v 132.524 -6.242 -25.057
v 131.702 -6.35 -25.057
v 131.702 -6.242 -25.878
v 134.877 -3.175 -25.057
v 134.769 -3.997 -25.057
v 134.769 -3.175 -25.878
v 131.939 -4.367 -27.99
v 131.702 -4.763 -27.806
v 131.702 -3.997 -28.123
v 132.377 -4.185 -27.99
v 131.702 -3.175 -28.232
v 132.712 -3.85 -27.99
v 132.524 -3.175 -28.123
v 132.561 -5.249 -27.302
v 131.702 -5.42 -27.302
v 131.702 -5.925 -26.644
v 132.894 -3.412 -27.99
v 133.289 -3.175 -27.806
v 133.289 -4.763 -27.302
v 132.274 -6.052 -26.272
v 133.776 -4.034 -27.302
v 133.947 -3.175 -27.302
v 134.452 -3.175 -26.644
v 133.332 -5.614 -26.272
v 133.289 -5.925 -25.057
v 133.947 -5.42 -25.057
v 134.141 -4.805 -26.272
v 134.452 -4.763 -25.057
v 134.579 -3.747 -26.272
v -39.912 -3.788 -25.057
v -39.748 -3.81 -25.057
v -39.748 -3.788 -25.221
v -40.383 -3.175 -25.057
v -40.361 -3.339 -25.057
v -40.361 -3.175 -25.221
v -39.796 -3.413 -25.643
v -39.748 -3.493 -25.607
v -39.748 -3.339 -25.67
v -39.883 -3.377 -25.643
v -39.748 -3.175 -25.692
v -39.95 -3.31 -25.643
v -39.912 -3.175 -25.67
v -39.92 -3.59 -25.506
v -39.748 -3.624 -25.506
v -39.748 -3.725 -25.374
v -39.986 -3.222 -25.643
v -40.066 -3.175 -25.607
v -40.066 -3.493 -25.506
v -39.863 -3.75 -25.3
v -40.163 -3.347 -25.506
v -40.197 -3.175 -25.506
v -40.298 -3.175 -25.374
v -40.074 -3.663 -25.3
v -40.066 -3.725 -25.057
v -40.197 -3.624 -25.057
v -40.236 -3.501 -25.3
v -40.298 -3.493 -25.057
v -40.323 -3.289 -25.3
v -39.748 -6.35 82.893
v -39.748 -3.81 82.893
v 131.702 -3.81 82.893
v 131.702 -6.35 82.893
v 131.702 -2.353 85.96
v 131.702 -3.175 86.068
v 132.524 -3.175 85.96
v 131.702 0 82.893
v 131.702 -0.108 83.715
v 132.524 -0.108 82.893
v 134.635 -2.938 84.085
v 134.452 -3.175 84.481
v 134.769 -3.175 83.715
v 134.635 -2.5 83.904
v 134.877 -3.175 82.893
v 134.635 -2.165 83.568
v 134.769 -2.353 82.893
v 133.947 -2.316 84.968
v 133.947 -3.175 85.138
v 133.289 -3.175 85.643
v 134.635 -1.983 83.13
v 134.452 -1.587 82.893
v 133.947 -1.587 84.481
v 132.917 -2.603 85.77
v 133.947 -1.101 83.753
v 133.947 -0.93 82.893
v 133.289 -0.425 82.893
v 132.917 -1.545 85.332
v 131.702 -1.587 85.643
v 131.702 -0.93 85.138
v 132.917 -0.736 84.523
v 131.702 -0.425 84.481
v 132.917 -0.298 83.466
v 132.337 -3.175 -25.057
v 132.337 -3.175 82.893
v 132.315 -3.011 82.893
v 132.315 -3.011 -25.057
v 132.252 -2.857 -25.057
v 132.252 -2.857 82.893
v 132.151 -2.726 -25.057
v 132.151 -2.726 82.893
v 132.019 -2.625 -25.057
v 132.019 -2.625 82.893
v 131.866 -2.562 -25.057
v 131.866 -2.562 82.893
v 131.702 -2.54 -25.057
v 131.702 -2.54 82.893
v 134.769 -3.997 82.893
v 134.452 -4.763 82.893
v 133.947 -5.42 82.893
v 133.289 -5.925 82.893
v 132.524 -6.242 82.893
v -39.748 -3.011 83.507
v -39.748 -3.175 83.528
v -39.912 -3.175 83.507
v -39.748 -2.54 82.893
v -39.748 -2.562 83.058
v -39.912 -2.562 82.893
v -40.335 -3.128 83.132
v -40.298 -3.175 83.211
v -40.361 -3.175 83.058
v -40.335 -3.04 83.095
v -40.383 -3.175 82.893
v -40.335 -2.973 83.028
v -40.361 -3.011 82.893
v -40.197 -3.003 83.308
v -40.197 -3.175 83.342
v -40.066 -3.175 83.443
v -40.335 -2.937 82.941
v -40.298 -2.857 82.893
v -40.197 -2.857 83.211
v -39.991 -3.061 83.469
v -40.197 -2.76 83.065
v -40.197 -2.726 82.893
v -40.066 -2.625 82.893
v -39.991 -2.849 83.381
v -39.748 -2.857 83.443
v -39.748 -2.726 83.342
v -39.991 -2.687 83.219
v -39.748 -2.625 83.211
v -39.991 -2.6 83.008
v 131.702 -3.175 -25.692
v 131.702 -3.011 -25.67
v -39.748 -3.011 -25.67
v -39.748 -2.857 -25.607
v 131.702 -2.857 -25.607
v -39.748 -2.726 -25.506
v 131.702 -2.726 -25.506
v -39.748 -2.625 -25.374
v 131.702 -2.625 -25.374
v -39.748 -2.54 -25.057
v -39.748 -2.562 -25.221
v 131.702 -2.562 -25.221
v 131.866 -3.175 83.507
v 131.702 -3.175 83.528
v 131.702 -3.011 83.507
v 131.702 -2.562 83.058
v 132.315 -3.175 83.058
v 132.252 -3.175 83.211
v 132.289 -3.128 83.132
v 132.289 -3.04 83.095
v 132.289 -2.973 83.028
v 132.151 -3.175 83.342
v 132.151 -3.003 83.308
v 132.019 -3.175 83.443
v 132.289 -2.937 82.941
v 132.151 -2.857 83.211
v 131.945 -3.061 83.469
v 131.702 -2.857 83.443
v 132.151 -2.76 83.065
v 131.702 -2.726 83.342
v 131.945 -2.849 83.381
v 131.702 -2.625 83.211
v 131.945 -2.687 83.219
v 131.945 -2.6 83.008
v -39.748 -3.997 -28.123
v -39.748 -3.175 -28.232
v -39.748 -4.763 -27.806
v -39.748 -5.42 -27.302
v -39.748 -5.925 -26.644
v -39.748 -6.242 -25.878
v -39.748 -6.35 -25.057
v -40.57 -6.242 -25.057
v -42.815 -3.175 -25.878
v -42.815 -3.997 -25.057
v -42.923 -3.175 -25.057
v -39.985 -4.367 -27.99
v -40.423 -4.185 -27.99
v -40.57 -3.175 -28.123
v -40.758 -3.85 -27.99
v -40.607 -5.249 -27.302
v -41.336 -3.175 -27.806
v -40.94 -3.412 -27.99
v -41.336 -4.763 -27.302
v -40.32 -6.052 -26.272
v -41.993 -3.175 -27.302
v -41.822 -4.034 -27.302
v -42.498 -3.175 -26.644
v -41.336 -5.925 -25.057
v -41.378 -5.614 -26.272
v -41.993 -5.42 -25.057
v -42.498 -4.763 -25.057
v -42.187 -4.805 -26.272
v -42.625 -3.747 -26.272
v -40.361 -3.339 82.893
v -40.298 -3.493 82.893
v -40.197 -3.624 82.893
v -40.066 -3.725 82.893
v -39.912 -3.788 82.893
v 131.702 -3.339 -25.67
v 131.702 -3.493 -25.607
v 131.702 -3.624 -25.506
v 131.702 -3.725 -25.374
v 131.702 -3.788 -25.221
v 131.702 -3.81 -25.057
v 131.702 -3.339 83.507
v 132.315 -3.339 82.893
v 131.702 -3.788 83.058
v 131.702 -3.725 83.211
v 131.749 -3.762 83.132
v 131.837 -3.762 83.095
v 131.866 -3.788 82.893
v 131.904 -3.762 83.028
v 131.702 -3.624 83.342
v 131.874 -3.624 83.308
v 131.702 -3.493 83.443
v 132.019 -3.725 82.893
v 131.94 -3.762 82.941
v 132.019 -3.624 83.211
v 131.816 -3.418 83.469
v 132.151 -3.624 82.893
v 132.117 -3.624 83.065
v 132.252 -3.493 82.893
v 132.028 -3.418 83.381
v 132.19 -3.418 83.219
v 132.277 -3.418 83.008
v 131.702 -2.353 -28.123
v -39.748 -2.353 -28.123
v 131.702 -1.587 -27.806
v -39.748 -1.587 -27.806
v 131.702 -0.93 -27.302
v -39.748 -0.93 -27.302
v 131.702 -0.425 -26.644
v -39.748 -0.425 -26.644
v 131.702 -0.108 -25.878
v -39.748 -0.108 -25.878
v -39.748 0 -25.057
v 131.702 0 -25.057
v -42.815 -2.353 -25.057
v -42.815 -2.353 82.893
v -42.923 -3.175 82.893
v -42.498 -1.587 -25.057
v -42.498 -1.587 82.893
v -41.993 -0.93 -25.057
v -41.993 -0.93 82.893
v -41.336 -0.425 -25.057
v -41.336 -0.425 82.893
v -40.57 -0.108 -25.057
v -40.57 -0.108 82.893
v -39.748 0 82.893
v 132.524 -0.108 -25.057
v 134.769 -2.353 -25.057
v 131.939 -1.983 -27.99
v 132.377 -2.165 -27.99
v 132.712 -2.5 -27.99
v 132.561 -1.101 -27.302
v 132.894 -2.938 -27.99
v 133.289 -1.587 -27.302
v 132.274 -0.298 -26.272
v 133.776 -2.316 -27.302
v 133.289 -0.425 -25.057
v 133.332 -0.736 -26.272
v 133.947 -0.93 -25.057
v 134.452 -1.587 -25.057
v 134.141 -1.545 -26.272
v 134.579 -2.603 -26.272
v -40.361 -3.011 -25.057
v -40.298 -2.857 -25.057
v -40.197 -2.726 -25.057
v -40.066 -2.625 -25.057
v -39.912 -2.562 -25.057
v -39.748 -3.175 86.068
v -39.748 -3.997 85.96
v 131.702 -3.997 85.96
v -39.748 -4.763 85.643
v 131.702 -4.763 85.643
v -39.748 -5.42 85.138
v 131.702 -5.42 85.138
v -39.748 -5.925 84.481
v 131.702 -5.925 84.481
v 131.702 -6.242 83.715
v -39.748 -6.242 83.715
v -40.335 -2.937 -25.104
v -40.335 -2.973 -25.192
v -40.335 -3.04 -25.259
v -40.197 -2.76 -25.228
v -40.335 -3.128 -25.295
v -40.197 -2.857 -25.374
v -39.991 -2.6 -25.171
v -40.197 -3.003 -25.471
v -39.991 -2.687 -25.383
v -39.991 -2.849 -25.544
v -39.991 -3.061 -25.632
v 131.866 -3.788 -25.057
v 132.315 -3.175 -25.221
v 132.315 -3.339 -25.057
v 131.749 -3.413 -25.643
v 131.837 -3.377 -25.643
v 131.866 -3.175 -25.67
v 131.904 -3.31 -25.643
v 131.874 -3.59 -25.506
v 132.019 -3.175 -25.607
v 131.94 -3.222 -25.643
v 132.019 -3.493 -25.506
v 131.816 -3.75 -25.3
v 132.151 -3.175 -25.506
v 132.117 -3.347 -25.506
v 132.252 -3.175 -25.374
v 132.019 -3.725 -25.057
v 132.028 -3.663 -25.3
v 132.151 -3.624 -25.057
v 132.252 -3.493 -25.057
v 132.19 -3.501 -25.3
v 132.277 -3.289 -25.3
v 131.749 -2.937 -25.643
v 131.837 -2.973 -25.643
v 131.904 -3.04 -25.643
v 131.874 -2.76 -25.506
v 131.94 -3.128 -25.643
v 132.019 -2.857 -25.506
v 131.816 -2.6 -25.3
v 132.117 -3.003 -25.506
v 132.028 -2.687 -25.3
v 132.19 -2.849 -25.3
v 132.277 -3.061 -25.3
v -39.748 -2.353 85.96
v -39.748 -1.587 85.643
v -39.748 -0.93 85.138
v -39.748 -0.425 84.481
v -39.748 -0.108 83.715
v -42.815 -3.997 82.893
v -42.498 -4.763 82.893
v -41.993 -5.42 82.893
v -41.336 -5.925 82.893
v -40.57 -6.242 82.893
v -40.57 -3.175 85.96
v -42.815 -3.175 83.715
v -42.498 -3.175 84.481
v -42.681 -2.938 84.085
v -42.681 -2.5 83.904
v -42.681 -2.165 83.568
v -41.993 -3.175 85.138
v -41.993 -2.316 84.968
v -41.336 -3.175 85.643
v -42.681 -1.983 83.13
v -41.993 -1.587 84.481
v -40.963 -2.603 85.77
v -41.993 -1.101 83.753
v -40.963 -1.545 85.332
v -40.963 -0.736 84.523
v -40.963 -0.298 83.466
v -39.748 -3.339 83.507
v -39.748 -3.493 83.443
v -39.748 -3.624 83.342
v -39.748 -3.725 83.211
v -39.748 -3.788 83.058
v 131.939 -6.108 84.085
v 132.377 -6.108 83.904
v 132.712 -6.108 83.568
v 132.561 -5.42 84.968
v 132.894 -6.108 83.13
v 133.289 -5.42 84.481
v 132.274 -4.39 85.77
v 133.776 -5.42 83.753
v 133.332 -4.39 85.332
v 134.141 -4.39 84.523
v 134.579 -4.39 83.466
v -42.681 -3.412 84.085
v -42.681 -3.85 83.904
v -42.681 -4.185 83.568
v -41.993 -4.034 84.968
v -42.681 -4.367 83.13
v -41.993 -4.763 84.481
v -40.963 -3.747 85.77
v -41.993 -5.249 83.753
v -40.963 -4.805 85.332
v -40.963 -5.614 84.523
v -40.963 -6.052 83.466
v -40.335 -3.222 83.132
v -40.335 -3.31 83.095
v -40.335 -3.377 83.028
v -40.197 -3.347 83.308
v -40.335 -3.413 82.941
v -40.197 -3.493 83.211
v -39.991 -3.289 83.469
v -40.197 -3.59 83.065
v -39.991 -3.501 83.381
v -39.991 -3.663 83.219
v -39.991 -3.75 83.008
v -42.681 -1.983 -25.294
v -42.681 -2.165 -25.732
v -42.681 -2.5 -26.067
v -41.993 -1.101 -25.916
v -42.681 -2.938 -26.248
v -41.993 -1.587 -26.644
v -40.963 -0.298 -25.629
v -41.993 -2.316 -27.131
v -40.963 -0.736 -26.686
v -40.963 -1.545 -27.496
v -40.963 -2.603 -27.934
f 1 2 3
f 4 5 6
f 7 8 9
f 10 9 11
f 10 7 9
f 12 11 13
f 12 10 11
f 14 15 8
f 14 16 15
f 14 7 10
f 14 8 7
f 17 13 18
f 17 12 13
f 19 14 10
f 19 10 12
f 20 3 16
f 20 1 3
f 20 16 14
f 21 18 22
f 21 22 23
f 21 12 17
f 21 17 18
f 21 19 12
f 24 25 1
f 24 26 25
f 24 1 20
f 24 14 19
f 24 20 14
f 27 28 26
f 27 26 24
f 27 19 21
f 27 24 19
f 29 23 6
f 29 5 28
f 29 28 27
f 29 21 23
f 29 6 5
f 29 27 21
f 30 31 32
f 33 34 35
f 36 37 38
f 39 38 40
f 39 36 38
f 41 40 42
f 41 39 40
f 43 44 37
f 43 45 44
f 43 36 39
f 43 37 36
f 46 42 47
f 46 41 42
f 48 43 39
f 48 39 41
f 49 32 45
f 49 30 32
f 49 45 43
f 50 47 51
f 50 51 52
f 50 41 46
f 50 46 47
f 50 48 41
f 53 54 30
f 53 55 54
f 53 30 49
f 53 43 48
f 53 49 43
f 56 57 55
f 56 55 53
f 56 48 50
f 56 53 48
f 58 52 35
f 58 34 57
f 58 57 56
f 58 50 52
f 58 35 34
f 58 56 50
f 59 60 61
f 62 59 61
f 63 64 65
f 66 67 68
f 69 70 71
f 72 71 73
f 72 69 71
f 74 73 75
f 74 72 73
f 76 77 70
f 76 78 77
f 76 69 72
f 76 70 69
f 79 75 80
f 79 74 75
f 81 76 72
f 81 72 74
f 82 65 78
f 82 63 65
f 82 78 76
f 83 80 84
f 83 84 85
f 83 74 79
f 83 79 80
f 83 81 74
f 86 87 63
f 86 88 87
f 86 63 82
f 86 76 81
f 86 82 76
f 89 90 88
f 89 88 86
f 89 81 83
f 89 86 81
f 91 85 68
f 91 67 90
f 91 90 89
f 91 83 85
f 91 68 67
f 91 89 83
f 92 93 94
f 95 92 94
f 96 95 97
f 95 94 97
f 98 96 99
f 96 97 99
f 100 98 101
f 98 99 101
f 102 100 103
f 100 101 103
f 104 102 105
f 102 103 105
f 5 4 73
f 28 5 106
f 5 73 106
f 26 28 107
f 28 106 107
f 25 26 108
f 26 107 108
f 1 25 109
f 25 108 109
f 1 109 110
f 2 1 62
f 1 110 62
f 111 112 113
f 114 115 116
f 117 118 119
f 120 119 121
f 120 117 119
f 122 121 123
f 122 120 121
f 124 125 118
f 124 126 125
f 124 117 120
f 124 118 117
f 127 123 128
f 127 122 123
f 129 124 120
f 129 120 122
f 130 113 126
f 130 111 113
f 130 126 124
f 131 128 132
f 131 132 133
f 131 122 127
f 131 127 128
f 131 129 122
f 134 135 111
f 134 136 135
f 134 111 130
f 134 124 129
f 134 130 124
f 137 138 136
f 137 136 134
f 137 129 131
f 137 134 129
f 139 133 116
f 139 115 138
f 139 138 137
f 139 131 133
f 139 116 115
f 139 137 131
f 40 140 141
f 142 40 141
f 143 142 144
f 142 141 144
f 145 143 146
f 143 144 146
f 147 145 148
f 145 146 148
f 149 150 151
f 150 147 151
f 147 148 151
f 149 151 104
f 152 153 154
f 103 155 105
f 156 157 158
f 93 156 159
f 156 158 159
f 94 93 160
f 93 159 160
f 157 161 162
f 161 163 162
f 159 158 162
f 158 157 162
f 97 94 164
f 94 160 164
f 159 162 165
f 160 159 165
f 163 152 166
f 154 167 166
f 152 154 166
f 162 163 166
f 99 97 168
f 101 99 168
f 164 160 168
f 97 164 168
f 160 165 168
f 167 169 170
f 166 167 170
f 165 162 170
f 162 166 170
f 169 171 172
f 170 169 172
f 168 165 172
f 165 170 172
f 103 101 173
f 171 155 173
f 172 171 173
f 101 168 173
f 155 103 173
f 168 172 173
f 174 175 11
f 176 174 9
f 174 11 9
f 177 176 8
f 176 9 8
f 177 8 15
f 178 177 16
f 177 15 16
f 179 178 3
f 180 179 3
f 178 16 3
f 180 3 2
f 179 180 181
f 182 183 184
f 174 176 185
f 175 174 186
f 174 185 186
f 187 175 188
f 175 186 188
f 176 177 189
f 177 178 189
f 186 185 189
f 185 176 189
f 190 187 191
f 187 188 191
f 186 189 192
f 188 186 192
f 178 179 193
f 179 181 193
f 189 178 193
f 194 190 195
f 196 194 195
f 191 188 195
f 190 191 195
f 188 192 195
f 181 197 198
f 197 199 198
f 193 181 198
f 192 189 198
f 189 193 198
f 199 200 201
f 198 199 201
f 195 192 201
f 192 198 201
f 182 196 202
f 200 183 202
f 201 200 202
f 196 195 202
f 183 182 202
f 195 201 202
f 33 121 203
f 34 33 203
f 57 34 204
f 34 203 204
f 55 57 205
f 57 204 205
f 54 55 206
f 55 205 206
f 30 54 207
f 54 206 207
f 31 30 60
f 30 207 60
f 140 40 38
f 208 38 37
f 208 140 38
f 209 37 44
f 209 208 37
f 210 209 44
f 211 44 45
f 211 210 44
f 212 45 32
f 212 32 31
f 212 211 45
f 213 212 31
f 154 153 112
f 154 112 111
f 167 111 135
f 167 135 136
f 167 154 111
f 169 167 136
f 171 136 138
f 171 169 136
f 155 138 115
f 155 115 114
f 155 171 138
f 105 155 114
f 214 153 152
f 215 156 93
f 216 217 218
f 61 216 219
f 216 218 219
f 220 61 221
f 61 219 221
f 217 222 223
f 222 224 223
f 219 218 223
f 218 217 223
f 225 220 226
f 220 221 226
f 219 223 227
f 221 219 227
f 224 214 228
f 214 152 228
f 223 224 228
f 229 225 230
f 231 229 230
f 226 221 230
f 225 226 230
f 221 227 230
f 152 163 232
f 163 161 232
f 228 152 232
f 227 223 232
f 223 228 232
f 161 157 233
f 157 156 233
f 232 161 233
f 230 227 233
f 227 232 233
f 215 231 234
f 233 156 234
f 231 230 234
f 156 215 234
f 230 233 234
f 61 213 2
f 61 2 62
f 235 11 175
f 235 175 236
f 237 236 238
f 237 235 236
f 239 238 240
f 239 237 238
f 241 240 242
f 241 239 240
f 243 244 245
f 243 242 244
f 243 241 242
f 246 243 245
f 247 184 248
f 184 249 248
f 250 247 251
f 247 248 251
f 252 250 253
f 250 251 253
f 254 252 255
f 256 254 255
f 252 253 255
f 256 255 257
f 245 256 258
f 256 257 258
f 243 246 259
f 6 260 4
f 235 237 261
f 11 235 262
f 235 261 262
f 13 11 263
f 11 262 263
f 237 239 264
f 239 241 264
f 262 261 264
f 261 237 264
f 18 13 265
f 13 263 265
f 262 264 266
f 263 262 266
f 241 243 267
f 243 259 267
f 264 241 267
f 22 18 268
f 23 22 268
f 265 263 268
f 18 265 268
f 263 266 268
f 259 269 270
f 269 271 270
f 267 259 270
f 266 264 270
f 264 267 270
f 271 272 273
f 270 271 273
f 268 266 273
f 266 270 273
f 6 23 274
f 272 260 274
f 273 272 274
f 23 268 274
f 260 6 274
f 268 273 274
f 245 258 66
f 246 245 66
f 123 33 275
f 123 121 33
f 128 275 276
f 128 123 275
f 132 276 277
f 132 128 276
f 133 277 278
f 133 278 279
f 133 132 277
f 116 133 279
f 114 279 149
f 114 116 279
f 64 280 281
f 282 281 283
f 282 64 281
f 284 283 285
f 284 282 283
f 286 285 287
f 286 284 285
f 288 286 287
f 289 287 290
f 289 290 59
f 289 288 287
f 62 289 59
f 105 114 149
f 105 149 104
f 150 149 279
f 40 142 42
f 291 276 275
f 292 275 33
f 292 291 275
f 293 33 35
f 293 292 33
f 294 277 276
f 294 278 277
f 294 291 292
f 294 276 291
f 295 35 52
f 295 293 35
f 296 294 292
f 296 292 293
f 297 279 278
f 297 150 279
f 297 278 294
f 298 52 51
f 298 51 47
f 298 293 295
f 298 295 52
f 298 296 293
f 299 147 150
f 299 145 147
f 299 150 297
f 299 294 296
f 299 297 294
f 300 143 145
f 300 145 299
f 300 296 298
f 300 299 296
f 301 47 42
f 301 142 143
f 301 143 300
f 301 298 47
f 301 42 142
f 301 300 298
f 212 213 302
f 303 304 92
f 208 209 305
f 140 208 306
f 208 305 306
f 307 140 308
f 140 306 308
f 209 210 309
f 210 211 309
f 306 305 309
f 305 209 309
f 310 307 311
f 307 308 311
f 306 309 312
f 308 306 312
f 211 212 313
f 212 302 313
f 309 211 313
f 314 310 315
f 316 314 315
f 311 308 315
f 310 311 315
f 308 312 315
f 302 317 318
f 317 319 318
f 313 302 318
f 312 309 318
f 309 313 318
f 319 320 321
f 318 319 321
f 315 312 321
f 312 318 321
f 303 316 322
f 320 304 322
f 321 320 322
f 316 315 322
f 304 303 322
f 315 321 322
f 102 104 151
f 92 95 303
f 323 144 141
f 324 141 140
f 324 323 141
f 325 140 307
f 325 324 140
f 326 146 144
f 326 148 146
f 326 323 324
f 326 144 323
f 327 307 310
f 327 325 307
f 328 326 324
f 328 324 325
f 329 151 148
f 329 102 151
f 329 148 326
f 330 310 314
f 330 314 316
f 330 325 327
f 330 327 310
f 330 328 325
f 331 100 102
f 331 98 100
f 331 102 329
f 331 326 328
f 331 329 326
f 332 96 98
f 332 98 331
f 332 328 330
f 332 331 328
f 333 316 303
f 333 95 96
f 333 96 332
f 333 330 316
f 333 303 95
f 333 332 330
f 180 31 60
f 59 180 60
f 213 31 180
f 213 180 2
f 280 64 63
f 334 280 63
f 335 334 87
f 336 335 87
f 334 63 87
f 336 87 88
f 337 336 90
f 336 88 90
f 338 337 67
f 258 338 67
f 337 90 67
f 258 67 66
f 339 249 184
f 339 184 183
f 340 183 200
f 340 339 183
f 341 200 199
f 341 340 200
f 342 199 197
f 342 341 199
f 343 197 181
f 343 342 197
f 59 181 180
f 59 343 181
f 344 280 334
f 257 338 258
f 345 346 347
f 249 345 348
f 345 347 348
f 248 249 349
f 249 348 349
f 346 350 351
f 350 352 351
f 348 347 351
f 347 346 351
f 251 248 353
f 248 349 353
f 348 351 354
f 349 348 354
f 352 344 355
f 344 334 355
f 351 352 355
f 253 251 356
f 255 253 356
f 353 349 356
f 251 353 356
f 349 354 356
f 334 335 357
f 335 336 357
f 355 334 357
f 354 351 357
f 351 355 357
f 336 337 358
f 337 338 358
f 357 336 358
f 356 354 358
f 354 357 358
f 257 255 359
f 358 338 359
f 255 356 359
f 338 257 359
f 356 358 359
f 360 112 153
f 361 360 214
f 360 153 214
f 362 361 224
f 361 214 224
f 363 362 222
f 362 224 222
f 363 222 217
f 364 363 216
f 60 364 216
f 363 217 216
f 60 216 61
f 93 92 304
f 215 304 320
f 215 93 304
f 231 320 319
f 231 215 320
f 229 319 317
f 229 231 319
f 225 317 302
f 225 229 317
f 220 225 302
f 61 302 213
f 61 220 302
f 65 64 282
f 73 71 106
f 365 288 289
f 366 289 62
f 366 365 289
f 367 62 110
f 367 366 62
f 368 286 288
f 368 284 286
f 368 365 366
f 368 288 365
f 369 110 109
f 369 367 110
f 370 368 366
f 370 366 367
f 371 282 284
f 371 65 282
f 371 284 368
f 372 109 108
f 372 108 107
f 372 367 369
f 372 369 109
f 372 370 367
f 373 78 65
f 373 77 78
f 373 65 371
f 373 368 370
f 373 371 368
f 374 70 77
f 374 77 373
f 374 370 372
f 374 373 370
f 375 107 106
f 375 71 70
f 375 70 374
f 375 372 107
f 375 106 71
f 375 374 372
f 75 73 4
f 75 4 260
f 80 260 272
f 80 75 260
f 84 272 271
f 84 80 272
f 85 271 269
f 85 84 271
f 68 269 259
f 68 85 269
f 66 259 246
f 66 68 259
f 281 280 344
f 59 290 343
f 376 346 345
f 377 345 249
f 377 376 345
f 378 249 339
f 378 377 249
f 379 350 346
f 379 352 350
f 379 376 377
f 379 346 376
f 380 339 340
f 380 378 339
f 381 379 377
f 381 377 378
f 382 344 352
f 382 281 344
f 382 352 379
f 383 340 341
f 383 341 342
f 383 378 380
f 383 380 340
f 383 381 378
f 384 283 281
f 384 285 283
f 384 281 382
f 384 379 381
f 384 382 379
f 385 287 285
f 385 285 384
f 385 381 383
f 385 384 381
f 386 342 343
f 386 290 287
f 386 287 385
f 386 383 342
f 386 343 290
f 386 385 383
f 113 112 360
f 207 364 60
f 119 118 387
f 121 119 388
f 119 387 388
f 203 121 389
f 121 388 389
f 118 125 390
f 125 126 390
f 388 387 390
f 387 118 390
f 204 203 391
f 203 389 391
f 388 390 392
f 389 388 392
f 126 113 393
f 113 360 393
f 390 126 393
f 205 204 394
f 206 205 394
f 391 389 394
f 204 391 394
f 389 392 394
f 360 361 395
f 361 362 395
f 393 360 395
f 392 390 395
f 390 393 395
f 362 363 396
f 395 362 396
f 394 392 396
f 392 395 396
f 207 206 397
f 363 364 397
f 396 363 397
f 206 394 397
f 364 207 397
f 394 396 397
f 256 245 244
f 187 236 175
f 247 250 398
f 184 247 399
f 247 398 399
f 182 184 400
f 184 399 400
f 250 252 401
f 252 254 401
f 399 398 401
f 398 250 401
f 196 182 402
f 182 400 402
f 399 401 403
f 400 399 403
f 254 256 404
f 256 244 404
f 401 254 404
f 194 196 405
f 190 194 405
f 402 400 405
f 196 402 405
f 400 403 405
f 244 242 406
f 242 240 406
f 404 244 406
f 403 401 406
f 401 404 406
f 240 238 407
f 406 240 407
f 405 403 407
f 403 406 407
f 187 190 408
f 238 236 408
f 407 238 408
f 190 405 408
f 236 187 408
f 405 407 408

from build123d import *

# Parameters (mm, degrees)
F0_W     = 177.8
F0_H     = 114.3
F1_DEPTH = 6.35
F2_R     = 3.17499
F3_T     = -2.54


# Not quite as in the source:
# - a fillet or chamfer is up to 0.001 mm smaller than in the source, because OpenCascade refuses the exact size
# - a shell that OpenCascade refuses in one call is made with other operations: the cavity is built on its own and cut out


with BuildPart() as f1:
    # F0 (on Front) → F1 (new body)
    with BuildSketch(Plane.XZ):
        with Locations((45.9769070864, 28.9183518412)):
            Rectangle(F0_W, F0_H)
    extrude(amount=F1_DEPTH)

    # F2 (radius 3.175 in the source; OpenCascade refuses exactly that, so slightly less here)
    f2_edges = [f1.edges().sort_by_distance(p)[0] for p in [
        (45.976907, 0, 86.068352),
        (134.876907, -3.175, 86.068352),
        (45.976907, -6.35, 86.068352),
        (-42.923093, -3.175, 86.068352),
        (-42.923093, -6.35, 28.918352),
        (134.876907, -6.35, 28.918352),
        (134.876907, 0, 28.918352),
        (45.976907, -6.35, -28.231648),
        (45.976907, 0, -28.231648),
        (-42.923093, 0, 28.918352),
        (134.876907, -3.175, -28.231648),
        (-42.923093, -3.175, -28.231648),
    ]]
    fillet(f2_edges, radius=F2_R)

    # F3: a shell. OpenCascade refuses it in one call, so the cavity is built on its own and cut out:
    # the body offset inwards by the wall thickness, plus a prism from it out through each open face.
    f3_core = offset(f1.part, amount=F3_T, mode=Mode.PRIVATE)
    f3_exits = [f3_core.faces().sort_by_distance(p)[0] for p in [
        (45.976907, -3.81, 28.918352),
    ]]
    add(f3_core, mode=Mode.SUBTRACT)
    extrude(f3_exits, amount=-F3_T, mode=Mode.SUBTRACT)


solid = f1.part
